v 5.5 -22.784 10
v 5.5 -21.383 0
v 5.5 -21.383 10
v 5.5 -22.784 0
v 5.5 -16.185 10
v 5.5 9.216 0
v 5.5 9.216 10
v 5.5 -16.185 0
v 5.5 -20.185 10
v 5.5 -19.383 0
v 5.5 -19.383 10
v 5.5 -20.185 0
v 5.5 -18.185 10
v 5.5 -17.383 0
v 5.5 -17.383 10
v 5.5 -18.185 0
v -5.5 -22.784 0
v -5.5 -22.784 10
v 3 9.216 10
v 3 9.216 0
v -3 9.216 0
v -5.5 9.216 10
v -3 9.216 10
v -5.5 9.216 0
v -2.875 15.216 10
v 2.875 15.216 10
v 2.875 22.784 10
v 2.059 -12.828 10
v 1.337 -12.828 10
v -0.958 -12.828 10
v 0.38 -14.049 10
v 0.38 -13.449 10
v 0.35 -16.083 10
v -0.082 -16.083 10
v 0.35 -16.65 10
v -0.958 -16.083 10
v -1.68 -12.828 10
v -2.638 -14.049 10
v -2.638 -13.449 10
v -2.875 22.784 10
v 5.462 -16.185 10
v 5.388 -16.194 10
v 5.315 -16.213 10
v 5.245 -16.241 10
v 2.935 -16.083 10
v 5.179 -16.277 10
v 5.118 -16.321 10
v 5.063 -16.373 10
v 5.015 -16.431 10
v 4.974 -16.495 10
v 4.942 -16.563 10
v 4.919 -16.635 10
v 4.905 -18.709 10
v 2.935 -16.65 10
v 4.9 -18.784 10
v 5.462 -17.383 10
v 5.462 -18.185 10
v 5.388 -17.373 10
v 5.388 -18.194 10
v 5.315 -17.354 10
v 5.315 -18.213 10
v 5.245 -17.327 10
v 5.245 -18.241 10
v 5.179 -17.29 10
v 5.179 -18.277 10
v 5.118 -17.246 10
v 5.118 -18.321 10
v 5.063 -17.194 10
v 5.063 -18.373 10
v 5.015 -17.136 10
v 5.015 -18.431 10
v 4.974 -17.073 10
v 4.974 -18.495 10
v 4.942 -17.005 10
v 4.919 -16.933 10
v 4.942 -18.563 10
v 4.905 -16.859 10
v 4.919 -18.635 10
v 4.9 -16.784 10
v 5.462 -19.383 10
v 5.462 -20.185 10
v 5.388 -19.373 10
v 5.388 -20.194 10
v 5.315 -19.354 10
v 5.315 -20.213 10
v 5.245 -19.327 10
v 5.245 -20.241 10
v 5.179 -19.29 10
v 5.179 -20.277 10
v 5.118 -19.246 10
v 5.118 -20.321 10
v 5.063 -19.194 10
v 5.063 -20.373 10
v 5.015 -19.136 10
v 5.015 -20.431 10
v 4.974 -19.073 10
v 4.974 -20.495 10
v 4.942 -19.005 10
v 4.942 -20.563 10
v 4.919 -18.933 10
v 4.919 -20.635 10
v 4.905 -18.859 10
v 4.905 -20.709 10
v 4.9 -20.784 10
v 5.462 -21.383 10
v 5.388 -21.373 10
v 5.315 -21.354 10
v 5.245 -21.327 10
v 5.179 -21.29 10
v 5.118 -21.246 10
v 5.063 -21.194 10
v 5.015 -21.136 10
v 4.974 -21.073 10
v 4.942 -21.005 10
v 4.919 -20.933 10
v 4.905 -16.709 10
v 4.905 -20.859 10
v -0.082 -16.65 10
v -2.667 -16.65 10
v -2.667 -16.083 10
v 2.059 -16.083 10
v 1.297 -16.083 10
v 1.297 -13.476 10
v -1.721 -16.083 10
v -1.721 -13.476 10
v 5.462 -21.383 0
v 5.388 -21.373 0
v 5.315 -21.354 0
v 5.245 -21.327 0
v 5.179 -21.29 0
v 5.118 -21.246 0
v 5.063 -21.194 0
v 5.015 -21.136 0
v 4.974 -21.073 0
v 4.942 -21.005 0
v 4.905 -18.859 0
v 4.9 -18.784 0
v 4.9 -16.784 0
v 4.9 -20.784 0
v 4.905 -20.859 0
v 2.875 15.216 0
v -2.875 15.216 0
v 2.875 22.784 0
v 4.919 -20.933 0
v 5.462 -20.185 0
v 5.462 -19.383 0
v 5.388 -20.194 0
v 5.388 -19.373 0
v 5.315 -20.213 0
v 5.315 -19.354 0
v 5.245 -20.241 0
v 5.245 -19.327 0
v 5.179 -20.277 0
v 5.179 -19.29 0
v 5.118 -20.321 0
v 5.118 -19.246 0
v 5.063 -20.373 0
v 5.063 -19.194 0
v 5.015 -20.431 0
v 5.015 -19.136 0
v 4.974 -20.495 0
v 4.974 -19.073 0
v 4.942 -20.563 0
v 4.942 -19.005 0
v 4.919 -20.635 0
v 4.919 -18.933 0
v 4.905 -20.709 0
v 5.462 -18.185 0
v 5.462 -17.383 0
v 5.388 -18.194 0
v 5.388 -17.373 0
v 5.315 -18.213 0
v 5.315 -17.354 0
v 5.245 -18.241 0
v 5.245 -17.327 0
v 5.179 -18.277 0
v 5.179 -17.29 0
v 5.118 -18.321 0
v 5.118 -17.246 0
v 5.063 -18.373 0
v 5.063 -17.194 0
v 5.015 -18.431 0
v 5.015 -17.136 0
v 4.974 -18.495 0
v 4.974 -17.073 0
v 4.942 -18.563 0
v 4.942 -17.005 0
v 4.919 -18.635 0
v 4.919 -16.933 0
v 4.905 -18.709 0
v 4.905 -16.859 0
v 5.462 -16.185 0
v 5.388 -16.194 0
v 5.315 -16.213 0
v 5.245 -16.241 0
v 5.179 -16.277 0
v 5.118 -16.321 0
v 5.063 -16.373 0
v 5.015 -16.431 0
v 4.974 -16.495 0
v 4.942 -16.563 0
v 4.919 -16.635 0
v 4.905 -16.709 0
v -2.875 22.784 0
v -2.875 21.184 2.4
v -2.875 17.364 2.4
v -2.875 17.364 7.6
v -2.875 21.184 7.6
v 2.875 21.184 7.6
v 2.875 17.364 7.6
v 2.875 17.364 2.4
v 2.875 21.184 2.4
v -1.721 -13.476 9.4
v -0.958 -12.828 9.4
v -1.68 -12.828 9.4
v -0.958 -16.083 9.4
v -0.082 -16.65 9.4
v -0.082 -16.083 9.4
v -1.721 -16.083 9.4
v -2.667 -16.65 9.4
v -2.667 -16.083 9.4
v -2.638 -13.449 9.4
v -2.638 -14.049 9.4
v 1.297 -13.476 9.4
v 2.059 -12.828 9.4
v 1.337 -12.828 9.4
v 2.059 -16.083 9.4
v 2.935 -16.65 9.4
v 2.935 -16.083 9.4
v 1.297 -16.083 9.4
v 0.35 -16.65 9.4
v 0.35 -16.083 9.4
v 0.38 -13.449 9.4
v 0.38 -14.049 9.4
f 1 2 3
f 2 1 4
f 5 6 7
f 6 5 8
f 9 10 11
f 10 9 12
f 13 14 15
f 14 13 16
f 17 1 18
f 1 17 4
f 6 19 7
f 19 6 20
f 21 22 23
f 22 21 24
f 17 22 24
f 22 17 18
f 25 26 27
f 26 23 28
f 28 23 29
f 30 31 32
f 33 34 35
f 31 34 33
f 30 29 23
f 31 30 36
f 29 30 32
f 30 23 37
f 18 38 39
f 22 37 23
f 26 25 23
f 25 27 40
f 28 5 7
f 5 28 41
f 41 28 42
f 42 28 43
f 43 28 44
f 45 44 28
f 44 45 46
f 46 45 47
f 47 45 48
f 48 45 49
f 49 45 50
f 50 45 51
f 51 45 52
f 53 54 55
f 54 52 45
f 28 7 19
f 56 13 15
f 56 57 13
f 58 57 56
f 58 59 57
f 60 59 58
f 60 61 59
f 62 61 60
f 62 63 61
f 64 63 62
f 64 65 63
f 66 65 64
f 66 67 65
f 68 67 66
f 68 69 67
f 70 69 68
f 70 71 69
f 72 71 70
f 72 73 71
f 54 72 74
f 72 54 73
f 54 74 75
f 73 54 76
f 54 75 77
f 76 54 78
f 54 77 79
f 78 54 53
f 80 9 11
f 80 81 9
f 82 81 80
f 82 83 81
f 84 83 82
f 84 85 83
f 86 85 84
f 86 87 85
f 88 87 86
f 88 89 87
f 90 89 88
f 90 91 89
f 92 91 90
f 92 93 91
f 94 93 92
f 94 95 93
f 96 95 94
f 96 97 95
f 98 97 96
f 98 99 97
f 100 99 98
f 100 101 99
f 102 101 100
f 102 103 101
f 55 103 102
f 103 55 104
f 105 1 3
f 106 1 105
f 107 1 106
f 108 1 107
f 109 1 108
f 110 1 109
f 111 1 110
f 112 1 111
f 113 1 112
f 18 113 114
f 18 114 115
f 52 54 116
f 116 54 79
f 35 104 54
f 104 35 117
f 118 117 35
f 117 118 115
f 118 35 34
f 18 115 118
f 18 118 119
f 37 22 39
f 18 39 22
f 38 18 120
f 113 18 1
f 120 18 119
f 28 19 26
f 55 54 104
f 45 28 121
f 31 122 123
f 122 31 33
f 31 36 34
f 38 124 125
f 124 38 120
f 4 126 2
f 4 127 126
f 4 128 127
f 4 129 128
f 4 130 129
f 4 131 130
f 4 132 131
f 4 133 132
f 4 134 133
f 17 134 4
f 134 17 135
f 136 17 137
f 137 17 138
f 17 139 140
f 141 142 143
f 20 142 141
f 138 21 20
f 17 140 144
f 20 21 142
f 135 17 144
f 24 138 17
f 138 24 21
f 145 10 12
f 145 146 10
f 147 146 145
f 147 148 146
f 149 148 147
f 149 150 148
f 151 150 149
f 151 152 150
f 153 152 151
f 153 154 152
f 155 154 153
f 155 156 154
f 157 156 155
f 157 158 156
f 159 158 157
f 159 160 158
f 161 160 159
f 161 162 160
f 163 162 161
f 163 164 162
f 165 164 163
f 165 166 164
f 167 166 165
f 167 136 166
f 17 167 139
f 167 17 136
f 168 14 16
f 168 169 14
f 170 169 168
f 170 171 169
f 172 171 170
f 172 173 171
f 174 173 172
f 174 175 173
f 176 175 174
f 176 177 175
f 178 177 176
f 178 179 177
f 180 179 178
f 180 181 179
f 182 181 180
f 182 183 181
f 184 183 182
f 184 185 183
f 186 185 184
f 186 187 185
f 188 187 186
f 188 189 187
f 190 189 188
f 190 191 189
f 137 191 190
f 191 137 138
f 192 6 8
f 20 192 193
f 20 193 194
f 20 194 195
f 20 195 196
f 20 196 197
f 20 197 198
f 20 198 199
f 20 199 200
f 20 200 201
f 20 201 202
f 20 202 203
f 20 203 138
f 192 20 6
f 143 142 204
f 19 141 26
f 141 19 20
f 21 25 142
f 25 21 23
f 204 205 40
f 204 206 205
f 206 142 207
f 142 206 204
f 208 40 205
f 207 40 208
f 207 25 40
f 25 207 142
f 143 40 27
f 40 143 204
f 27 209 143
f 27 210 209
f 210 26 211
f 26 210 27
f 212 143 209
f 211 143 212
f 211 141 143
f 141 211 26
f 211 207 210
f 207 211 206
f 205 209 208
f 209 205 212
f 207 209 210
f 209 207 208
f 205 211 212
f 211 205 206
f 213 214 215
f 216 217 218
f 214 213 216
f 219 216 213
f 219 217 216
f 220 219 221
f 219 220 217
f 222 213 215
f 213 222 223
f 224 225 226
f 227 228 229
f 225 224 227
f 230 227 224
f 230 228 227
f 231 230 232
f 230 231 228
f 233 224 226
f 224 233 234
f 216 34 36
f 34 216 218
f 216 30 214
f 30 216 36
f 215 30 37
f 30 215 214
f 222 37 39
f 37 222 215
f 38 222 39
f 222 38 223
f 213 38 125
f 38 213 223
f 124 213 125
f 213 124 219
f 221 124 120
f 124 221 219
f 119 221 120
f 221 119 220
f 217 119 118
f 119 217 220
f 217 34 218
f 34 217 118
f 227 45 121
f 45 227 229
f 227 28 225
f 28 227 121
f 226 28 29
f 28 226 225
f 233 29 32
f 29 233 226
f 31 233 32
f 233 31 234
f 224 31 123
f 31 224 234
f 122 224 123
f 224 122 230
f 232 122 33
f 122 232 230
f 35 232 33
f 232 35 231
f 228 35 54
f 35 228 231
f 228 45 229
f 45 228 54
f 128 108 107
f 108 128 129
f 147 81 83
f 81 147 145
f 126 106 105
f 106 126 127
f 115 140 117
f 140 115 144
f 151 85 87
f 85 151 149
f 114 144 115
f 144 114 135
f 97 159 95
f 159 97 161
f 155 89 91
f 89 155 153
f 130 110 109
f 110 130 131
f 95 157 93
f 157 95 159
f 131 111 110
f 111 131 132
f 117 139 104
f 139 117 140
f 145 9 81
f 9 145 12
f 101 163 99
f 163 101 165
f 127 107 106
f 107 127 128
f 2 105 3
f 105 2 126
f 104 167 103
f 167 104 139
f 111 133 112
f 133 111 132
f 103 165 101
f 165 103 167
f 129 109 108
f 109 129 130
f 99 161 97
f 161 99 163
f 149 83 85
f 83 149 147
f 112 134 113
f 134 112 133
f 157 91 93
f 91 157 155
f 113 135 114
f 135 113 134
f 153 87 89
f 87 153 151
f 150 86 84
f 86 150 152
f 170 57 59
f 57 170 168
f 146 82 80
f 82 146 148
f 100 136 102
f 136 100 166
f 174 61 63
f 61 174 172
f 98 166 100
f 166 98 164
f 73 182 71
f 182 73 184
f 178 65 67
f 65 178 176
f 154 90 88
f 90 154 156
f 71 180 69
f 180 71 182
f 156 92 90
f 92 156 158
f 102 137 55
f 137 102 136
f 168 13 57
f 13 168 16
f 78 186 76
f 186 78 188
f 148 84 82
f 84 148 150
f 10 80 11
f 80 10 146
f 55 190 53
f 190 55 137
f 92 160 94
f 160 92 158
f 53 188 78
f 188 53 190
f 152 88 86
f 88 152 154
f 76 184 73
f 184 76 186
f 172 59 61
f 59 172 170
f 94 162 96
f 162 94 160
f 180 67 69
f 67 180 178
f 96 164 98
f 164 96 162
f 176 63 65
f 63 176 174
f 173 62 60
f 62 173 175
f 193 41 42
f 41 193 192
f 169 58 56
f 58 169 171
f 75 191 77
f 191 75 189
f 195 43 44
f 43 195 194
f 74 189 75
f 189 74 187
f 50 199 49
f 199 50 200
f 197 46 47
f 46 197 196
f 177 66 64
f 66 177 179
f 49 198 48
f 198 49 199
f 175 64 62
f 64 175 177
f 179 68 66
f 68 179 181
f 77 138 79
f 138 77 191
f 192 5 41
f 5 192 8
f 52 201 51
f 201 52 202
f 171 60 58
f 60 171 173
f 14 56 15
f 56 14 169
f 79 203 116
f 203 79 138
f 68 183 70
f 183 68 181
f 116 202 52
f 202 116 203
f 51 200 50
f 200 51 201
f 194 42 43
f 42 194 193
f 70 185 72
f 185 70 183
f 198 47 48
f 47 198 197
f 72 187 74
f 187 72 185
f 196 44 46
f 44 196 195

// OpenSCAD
$fn = 50;

difference() {
	union() {
		translate(v = [0, 9.21625, 0]) {
			rotate(a = [90, 0, 0]) {
				difference() {
					union() {
						translate(v = [-5.5, 0, 0]) {
							cube(size = [11.0, 10.0, 32.0]);
						}
						translate(v = [0, 10.0, 0]) {
							rotate(a = [90, 0, 0]) {
								linear_extrude(height = 10.0) {
									polygon(points = [[-2.875, -13.5675], [2.875, -13.5675], [2.875, -6.0], [3.0, 0], [3.0, 0.1], [-3.0, 0.1], [-3.0, 0], [-2.875, -6.0]]);
								}
							}
						}
					}
					union() {
						translate(v = [-2.975, 2.4000000000000004, -11.9675]) {
							cube(size = [5.95, 5.199999999999999, 3.8200000000000003]);
						}
						translate(v = [0, 9.4, 24.0]) {
							rotate(a = [-90, 0, 0]) {
								linear_extrude(height = 0.7) {
									text(font = "Arial:style=Bold", halign = "center", size = 4.0, text = "11", valign = "center");
								}
							}
						}
						translate(v = [5.5, 10.1, 30.0]) {
							rotate(a = [90, 0, 0]) {
								cylinder(h = 10.2, r = 0.6);
							}
						}
						translate(v = [5.5, 10.1, 28.0]) {
							rotate(a = [90, 0, 0]) {
								cylinder(h = 10.2, r = 0.6);
							}
						}
						translate(v = [5.5, 10.1, 26.0]) {
							rotate(a = [90, 0, 0]) {
								cylinder(h = 10.2, r = 0.6);
							}
						}
					}
				}
			}
		}
	}
	union();
}
